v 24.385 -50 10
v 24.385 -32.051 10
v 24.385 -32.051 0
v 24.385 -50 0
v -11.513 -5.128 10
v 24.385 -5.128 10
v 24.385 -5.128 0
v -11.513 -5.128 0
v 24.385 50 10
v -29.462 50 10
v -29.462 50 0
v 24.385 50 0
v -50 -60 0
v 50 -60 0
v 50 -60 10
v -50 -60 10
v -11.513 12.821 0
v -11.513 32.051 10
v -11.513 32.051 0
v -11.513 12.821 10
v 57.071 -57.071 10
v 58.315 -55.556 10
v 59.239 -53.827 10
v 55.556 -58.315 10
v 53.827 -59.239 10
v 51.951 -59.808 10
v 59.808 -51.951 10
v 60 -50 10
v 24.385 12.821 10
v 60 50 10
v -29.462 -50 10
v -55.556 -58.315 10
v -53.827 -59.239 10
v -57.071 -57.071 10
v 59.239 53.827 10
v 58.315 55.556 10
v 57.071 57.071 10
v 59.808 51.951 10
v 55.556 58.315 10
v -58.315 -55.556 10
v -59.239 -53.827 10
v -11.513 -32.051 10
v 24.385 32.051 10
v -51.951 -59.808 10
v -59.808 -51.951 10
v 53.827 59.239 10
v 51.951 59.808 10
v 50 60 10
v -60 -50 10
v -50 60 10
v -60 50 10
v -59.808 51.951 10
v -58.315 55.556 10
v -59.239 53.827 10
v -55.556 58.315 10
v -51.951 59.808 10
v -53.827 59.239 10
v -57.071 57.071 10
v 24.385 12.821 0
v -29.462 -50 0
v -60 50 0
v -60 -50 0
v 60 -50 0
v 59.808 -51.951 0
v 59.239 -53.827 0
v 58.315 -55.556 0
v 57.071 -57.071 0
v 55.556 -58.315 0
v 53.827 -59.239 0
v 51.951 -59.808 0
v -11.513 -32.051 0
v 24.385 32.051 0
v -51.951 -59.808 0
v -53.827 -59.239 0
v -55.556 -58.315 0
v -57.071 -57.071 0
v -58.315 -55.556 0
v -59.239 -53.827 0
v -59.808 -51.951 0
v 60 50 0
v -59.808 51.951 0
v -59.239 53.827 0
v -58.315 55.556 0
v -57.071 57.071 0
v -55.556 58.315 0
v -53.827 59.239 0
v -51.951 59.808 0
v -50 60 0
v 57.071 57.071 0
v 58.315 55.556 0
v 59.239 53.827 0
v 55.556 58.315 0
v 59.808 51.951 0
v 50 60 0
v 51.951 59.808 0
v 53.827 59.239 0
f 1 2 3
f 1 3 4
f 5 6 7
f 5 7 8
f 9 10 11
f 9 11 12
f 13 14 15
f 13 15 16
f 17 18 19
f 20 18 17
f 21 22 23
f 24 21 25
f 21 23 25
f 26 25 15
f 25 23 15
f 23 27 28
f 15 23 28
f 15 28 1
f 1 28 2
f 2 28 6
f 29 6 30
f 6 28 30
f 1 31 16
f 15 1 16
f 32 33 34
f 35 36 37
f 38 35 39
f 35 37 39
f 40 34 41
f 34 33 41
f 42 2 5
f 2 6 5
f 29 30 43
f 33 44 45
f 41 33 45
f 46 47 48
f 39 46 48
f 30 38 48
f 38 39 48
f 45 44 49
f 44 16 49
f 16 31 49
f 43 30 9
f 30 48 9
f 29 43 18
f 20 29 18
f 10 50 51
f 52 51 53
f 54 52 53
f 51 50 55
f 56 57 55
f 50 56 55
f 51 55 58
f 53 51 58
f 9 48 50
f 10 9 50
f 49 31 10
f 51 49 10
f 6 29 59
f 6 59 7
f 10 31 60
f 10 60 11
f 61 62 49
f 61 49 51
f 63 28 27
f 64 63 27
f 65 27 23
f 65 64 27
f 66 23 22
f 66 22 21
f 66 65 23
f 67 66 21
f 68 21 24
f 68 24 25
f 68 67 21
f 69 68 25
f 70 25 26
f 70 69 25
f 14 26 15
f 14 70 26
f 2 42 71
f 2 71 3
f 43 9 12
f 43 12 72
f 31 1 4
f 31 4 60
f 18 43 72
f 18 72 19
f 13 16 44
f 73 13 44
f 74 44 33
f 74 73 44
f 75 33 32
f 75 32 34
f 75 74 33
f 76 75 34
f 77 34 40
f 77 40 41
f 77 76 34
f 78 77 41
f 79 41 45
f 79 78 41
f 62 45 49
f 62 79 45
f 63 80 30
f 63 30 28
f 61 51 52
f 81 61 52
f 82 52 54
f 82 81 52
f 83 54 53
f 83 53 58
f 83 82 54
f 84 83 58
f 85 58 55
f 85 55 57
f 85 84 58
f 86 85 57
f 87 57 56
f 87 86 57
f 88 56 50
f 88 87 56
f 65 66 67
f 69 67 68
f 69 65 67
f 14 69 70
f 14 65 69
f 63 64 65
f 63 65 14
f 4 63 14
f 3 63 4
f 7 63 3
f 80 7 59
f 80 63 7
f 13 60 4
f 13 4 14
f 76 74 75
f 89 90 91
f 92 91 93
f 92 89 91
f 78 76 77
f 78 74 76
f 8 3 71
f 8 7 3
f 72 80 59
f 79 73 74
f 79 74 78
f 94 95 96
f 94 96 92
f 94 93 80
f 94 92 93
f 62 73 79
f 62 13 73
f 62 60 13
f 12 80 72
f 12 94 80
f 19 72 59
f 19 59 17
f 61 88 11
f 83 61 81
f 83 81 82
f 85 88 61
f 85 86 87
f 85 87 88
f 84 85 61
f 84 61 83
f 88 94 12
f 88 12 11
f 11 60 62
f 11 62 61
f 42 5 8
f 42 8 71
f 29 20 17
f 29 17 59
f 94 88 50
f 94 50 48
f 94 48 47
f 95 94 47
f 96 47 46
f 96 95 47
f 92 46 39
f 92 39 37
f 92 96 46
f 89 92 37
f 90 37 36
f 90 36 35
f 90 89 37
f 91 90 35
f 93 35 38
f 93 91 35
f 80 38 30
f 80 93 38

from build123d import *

# Parameters (mm, degrees)
BOSS_EXTRUDE1_DEPTH = 10
CUT_EXTRUDE18_DEPTH = 10


with BuildPart() as part:
    # Sketch1 → Boss-Extrude1 (new body)
    with BuildSketch(Plane.XY):
        with BuildLine():
            Line((-50, 60), (50, 60))
            ThreePointArc((50, 60), (57.071067812, 57.071067812), (60, 50))
            Line((60, 50), (60, -50))
            ThreePointArc((60, -50), (57.071067812, -57.071067812), (50, -60))
            Line((50, -60), (-50, -60))
            ThreePointArc((-50, -60), (-57.071067812, -57.071067812), (-60, -50))
            Line((-60, -50), (-60, 50))
            ThreePointArc((-60, 50), (-57.071067812, 57.071067812), (-50, 60))
        make_face()
    extrude(amount=BOSS_EXTRUDE1_DEPTH)

    # Sketch2 → Cut-Extrude18 (cut)
    with BuildSketch(Plane.XY.offset(10)):
        Polygon((-29.461538462, 50), (24.384615385, 50), (24.384615385, 32.051282051), (-11.512820513, 32.051282051), (-11.512820513, 12.820512821), (24.384615385, 12.820512821), (24.384615385, -5.128205128), (-11.512820513, -5.128205128), (-11.512820513, -32.051282051), (24.384615385, -32.051282051), (24.384615385, -50), (-29.461538462, -50), align=None)
    extrude(amount=-CUT_EXTRUDE18_DEPTH, mode=Mode.SUBTRACT)


solid = part.part
